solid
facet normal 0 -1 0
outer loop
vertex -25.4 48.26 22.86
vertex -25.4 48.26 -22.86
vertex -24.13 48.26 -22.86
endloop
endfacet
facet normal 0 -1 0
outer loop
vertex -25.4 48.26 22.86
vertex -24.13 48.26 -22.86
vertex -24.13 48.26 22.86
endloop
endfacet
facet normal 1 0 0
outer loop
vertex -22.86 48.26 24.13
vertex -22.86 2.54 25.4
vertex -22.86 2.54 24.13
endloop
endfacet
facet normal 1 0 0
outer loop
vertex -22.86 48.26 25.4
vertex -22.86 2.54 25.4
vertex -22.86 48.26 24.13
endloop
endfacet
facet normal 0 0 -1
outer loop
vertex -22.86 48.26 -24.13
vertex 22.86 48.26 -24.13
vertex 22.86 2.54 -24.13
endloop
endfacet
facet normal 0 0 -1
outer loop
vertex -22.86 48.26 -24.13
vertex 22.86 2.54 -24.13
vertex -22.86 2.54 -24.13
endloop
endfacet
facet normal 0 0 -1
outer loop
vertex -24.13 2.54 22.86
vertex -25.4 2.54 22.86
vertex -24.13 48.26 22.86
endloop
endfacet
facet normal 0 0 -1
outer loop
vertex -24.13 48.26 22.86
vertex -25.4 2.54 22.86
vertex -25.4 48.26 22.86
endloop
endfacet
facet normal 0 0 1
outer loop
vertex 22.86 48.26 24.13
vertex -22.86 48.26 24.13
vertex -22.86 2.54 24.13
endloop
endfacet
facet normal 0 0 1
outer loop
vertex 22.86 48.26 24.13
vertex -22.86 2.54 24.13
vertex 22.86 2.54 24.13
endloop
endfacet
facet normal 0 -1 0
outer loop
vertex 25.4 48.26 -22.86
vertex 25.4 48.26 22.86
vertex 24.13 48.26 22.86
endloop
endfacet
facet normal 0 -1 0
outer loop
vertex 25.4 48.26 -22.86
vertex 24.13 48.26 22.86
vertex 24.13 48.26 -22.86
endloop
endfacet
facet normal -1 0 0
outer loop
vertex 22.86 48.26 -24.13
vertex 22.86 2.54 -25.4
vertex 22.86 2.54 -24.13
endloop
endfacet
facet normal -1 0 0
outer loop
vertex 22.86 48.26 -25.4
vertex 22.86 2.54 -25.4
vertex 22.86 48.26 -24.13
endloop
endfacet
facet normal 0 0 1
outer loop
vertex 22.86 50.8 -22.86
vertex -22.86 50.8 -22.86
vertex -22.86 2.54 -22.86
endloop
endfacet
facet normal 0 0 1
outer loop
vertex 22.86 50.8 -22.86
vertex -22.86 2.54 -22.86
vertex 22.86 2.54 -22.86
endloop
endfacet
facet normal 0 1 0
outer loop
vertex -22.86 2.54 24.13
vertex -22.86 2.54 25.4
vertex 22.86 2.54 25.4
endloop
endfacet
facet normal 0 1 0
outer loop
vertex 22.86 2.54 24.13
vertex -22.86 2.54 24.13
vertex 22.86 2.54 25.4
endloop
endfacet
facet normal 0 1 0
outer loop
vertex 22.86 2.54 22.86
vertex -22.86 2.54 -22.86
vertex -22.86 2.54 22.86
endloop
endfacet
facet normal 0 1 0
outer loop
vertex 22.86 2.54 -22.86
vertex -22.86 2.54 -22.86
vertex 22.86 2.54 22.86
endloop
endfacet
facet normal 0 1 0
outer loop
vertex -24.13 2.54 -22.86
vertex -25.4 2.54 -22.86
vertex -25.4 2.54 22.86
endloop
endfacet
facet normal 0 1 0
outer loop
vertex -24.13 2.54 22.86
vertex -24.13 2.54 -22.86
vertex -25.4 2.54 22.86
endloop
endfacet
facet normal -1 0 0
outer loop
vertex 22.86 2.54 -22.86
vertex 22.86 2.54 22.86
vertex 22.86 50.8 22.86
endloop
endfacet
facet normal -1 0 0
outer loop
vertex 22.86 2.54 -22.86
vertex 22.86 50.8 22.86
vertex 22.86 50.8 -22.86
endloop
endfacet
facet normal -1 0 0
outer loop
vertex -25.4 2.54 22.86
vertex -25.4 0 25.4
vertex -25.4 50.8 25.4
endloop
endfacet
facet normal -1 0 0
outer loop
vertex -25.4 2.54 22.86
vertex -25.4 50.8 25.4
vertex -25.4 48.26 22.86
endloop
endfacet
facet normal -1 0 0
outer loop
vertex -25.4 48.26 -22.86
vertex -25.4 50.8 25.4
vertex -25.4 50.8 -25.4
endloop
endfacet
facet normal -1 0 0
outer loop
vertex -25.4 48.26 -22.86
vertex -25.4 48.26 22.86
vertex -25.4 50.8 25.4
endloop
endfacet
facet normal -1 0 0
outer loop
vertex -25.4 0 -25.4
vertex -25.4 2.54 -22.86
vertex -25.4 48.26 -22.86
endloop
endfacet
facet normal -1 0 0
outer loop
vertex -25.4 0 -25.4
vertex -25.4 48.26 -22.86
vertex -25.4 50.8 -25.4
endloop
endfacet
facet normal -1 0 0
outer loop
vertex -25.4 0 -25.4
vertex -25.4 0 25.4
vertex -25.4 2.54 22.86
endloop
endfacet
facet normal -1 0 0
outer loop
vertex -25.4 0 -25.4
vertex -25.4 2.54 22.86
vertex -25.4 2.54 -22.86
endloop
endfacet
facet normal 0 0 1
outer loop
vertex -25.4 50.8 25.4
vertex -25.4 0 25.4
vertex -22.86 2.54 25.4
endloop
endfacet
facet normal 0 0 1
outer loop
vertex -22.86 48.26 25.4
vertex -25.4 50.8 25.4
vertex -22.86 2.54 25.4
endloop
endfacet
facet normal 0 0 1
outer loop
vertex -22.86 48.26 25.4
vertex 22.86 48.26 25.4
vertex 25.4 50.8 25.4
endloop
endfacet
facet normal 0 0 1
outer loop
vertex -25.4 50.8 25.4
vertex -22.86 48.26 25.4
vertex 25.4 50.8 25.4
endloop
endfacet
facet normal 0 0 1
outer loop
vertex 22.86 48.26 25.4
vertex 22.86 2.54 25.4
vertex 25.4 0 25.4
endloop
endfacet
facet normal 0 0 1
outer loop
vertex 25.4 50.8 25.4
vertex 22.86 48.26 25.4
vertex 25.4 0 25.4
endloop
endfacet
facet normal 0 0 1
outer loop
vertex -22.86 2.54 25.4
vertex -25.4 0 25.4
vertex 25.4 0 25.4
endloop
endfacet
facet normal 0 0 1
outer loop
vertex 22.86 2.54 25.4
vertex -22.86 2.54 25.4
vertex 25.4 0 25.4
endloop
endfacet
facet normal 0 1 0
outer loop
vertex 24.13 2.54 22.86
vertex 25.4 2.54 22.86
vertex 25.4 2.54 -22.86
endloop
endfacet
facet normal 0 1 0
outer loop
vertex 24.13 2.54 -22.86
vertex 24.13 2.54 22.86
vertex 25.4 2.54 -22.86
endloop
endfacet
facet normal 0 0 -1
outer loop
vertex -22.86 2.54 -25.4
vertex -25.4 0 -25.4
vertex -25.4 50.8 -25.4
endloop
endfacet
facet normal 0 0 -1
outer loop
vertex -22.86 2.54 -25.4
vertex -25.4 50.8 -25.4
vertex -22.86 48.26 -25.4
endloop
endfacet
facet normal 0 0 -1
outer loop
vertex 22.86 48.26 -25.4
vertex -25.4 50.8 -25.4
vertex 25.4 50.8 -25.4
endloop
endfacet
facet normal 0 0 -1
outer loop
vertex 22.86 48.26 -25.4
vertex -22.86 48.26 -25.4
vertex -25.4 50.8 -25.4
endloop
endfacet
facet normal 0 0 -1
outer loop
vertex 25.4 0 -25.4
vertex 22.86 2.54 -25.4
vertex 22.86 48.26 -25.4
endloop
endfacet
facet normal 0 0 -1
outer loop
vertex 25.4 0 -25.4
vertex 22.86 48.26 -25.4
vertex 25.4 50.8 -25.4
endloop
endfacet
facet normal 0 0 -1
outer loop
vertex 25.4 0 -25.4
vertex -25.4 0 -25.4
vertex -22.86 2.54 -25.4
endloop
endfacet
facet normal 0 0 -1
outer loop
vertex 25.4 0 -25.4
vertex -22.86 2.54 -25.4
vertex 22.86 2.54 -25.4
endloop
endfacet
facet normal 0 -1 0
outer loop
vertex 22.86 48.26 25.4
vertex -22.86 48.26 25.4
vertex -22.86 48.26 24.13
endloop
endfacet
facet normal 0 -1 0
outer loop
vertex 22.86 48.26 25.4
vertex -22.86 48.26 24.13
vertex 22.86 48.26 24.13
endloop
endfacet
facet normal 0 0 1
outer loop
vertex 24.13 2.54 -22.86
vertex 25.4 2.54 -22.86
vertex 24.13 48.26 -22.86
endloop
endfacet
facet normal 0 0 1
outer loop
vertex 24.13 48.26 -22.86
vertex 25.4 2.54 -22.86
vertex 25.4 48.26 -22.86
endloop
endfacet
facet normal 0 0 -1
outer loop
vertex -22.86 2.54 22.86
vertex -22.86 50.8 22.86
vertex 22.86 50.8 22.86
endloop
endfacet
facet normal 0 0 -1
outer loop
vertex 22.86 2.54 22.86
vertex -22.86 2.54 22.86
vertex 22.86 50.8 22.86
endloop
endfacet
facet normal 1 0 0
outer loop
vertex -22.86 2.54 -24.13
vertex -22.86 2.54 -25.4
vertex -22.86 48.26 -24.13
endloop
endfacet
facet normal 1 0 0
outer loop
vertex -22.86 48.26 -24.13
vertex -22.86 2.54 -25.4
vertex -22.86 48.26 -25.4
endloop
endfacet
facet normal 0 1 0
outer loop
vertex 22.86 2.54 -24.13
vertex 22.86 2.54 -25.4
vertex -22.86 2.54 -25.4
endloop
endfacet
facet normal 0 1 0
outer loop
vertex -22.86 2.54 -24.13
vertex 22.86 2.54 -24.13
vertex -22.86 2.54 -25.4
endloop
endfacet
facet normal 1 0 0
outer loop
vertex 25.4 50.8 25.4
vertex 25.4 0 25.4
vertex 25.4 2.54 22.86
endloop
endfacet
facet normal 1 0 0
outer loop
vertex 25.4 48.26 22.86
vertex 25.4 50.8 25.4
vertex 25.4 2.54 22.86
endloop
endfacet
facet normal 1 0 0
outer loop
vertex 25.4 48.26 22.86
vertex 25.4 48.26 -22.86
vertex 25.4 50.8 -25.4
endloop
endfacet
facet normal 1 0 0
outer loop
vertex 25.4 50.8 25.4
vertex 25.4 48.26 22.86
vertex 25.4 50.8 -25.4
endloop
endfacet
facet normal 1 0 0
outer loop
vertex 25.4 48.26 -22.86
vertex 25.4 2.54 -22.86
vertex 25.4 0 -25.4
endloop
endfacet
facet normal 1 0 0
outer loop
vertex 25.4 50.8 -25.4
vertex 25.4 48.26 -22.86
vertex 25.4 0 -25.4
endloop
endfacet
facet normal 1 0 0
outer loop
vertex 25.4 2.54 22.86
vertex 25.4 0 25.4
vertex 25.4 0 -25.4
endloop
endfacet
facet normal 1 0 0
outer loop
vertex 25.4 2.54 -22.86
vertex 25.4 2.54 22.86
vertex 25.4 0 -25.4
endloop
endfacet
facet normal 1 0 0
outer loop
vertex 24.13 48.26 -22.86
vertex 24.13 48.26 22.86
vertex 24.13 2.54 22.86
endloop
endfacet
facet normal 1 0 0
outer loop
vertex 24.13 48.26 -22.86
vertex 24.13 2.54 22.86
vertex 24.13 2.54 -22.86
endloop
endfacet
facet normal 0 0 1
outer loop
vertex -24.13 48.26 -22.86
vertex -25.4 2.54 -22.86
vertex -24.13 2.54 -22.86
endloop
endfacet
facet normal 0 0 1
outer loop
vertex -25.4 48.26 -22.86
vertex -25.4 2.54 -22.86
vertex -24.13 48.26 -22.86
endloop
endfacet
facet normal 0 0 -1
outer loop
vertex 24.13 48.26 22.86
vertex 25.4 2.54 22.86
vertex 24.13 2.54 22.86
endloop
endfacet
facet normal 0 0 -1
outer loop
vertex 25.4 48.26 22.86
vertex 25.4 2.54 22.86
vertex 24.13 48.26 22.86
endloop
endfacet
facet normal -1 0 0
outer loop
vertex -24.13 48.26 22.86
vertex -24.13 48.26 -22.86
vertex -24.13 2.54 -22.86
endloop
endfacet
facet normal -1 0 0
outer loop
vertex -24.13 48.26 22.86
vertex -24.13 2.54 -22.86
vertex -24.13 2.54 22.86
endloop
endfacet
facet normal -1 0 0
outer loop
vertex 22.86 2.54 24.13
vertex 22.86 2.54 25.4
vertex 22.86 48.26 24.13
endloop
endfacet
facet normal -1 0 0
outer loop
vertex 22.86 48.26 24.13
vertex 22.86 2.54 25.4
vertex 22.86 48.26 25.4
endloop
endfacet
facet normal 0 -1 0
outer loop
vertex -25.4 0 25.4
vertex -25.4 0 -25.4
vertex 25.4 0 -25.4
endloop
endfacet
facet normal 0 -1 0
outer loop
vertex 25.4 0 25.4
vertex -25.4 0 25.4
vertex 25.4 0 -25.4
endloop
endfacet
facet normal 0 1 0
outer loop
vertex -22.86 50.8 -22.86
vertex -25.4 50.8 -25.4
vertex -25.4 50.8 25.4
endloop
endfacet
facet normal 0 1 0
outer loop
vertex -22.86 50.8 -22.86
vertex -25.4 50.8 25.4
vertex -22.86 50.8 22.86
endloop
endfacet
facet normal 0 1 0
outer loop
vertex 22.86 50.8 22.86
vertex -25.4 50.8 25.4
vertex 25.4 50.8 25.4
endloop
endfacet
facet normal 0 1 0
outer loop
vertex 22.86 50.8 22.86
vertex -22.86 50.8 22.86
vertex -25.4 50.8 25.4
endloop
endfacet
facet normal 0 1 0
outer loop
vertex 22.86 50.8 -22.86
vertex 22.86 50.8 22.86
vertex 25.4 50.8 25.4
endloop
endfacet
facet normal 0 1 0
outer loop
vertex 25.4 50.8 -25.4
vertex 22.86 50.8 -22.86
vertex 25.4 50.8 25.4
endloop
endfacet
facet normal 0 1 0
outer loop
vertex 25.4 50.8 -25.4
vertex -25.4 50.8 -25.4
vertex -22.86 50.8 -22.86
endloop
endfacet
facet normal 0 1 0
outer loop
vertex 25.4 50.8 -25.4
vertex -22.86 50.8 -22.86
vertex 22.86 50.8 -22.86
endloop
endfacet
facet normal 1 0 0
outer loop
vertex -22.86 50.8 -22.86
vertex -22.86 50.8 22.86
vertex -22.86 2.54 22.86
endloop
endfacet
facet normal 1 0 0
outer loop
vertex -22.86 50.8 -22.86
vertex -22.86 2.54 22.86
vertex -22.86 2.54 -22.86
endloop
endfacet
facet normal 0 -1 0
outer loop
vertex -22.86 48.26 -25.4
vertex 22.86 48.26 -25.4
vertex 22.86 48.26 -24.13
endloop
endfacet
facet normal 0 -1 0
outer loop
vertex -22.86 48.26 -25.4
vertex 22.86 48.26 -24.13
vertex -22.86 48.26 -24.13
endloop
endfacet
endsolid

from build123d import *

# Parameters (mm, degrees)
SKETCH1_W           = 50.8
SKETCH1_H           = 50.8
BOSS_EXTRUDE1_DEPTH = 50.8
SHELL1_T            = -2.54
SKETCH2_W           = 45.72
SKETCH2_H           = 45.72
CUT_EXTRUDE1_DEPTH  = 1.27
SKETCH3_W           = 45.72
SKETCH3_H           = 45.72
CUT_EXTRUDE2_DEPTH  = 1.27
SKETCH4_W           = 45.72
SKETCH4_H           = 45.72
CUT_EXTRUDE3_DEPTH  = 1.27
SKETCH5_W           = 45.72
SKETCH5_H           = 45.72
CUT_EXTRUDE4_DEPTH  = 1.27


with BuildPart() as part:
    # Sketch1 → Boss-Extrude1 (new body)
    with BuildSketch(Plane(origin=(0, 0, 0), x_dir=(1, 0, 0), z_dir=(0, 1, 0))):
        Rectangle(SKETCH1_W, SKETCH1_H)
    extrude(amount=BOSS_EXTRUDE1_DEPTH)

    # Shell1
    shell1_openings = [part.faces().sort_by_distance(p)[0] for p in [
        (0, 50.8, 0),
    ]]
    offset(amount=SHELL1_T, openings=shell1_openings, kind=Kind.INTERSECTION)

    # Sketch2 → Cut-Extrude1 (cut)
    with BuildSketch(Plane.XY.offset(25.4)):
        with Locations((0, 25.4)):
            Rectangle(SKETCH2_W, SKETCH2_H)
    extrude(amount=-CUT_EXTRUDE1_DEPTH, mode=Mode.SUBTRACT)

    # Sketch3 → Cut-Extrude2 (cut)
    with BuildSketch(Plane(origin=(25.4, 0, 0), x_dir=(0, 0, -1), z_dir=(1, 0, 0))):
        with Locations((0, 25.4)):
            Rectangle(SKETCH3_W, SKETCH3_H)
    extrude(amount=-CUT_EXTRUDE2_DEPTH, mode=Mode.SUBTRACT)

    # Sketch4 → Cut-Extrude3 (cut)
    with BuildSketch(Plane(origin=(0, 0, -25.4), x_dir=(-1, 0, 0), z_dir=(0, 0, -1))):
        with Locations((0, 25.4)):
            Rectangle(SKETCH4_W, SKETCH4_H)
    extrude(amount=-CUT_EXTRUDE3_DEPTH, mode=Mode.SUBTRACT)

    # Sketch5 → Cut-Extrude4 (cut)
    with BuildSketch(Plane.ZY.offset(25.4)):
        with Locations((0, 25.4)):
            Rectangle(SKETCH5_W, SKETCH5_H)
    extrude(amount=-CUT_EXTRUDE4_DEPTH, mode=Mode.SUBTRACT)


solid = part.part
